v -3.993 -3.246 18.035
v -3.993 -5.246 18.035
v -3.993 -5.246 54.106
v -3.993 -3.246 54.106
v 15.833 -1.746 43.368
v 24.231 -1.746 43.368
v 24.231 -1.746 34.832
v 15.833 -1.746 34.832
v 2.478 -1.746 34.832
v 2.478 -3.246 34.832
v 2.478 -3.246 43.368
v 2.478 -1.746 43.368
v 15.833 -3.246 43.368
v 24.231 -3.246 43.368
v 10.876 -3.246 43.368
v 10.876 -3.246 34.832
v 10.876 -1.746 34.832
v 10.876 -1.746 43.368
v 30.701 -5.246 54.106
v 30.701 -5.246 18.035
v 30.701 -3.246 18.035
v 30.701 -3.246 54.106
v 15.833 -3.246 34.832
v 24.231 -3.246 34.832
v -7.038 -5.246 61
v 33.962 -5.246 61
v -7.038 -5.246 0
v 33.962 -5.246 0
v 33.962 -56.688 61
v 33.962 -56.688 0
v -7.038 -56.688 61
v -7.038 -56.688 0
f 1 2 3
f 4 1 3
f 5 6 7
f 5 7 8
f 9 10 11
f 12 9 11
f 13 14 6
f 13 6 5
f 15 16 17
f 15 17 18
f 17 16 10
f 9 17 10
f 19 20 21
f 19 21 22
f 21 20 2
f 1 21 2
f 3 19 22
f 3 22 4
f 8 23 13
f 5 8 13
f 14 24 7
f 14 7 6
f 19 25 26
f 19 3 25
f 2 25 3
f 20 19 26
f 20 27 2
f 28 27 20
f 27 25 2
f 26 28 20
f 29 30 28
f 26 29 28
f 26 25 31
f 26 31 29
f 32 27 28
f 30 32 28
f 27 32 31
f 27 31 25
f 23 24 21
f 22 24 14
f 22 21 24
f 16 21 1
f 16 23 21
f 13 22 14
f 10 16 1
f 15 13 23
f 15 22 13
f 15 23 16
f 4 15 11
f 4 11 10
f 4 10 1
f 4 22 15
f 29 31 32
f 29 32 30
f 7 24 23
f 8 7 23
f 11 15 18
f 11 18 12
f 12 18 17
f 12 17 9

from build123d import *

# Parameters (mm, degrees)
F0_W     = 41
F0_H     = 51.442152
F1_DEPTH = 61
F2_W     = 34.694057
F2_H     = 36.070803
F3_DEPTH = 2
F4_W     = 8.398162
F4_H     = 8.535839
F5_DEPTH = 1.5


with BuildPart() as f1:
    # F0 (on Top) → F1 (new body)
    with BuildSketch(Plane.XY):
        with Locations((13.462494, -30.967161)):
            Rectangle(F0_W, F0_H)
    extrude(amount=F1_DEPTH)

    # F2 (on face) → F3 (join)
    with BuildSketch(Plane(origin=(0, -5.246085, 0), x_dir=(-1, 0, 0), z_dir=(0, 1, 0))):
        with Locations((-13.354457, 36.070805)):
            Rectangle(F2_W, F2_H)
    extrude(amount=F3_DEPTH)

    # F4 (on face) → F5 (join)
    with BuildSketch(Plane(origin=(0, -3.246085, 0), x_dir=(-1, 0, 0), z_dir=(0, 1, 0))):
        with Locations((-20.031688, 39.099652)):
            Rectangle(F4_W, F4_H)
        with Locations((-6.677231, 39.099652)):
            Rectangle(F4_W, F4_H)
    extrude(amount=F5_DEPTH)


solid = f1.part
